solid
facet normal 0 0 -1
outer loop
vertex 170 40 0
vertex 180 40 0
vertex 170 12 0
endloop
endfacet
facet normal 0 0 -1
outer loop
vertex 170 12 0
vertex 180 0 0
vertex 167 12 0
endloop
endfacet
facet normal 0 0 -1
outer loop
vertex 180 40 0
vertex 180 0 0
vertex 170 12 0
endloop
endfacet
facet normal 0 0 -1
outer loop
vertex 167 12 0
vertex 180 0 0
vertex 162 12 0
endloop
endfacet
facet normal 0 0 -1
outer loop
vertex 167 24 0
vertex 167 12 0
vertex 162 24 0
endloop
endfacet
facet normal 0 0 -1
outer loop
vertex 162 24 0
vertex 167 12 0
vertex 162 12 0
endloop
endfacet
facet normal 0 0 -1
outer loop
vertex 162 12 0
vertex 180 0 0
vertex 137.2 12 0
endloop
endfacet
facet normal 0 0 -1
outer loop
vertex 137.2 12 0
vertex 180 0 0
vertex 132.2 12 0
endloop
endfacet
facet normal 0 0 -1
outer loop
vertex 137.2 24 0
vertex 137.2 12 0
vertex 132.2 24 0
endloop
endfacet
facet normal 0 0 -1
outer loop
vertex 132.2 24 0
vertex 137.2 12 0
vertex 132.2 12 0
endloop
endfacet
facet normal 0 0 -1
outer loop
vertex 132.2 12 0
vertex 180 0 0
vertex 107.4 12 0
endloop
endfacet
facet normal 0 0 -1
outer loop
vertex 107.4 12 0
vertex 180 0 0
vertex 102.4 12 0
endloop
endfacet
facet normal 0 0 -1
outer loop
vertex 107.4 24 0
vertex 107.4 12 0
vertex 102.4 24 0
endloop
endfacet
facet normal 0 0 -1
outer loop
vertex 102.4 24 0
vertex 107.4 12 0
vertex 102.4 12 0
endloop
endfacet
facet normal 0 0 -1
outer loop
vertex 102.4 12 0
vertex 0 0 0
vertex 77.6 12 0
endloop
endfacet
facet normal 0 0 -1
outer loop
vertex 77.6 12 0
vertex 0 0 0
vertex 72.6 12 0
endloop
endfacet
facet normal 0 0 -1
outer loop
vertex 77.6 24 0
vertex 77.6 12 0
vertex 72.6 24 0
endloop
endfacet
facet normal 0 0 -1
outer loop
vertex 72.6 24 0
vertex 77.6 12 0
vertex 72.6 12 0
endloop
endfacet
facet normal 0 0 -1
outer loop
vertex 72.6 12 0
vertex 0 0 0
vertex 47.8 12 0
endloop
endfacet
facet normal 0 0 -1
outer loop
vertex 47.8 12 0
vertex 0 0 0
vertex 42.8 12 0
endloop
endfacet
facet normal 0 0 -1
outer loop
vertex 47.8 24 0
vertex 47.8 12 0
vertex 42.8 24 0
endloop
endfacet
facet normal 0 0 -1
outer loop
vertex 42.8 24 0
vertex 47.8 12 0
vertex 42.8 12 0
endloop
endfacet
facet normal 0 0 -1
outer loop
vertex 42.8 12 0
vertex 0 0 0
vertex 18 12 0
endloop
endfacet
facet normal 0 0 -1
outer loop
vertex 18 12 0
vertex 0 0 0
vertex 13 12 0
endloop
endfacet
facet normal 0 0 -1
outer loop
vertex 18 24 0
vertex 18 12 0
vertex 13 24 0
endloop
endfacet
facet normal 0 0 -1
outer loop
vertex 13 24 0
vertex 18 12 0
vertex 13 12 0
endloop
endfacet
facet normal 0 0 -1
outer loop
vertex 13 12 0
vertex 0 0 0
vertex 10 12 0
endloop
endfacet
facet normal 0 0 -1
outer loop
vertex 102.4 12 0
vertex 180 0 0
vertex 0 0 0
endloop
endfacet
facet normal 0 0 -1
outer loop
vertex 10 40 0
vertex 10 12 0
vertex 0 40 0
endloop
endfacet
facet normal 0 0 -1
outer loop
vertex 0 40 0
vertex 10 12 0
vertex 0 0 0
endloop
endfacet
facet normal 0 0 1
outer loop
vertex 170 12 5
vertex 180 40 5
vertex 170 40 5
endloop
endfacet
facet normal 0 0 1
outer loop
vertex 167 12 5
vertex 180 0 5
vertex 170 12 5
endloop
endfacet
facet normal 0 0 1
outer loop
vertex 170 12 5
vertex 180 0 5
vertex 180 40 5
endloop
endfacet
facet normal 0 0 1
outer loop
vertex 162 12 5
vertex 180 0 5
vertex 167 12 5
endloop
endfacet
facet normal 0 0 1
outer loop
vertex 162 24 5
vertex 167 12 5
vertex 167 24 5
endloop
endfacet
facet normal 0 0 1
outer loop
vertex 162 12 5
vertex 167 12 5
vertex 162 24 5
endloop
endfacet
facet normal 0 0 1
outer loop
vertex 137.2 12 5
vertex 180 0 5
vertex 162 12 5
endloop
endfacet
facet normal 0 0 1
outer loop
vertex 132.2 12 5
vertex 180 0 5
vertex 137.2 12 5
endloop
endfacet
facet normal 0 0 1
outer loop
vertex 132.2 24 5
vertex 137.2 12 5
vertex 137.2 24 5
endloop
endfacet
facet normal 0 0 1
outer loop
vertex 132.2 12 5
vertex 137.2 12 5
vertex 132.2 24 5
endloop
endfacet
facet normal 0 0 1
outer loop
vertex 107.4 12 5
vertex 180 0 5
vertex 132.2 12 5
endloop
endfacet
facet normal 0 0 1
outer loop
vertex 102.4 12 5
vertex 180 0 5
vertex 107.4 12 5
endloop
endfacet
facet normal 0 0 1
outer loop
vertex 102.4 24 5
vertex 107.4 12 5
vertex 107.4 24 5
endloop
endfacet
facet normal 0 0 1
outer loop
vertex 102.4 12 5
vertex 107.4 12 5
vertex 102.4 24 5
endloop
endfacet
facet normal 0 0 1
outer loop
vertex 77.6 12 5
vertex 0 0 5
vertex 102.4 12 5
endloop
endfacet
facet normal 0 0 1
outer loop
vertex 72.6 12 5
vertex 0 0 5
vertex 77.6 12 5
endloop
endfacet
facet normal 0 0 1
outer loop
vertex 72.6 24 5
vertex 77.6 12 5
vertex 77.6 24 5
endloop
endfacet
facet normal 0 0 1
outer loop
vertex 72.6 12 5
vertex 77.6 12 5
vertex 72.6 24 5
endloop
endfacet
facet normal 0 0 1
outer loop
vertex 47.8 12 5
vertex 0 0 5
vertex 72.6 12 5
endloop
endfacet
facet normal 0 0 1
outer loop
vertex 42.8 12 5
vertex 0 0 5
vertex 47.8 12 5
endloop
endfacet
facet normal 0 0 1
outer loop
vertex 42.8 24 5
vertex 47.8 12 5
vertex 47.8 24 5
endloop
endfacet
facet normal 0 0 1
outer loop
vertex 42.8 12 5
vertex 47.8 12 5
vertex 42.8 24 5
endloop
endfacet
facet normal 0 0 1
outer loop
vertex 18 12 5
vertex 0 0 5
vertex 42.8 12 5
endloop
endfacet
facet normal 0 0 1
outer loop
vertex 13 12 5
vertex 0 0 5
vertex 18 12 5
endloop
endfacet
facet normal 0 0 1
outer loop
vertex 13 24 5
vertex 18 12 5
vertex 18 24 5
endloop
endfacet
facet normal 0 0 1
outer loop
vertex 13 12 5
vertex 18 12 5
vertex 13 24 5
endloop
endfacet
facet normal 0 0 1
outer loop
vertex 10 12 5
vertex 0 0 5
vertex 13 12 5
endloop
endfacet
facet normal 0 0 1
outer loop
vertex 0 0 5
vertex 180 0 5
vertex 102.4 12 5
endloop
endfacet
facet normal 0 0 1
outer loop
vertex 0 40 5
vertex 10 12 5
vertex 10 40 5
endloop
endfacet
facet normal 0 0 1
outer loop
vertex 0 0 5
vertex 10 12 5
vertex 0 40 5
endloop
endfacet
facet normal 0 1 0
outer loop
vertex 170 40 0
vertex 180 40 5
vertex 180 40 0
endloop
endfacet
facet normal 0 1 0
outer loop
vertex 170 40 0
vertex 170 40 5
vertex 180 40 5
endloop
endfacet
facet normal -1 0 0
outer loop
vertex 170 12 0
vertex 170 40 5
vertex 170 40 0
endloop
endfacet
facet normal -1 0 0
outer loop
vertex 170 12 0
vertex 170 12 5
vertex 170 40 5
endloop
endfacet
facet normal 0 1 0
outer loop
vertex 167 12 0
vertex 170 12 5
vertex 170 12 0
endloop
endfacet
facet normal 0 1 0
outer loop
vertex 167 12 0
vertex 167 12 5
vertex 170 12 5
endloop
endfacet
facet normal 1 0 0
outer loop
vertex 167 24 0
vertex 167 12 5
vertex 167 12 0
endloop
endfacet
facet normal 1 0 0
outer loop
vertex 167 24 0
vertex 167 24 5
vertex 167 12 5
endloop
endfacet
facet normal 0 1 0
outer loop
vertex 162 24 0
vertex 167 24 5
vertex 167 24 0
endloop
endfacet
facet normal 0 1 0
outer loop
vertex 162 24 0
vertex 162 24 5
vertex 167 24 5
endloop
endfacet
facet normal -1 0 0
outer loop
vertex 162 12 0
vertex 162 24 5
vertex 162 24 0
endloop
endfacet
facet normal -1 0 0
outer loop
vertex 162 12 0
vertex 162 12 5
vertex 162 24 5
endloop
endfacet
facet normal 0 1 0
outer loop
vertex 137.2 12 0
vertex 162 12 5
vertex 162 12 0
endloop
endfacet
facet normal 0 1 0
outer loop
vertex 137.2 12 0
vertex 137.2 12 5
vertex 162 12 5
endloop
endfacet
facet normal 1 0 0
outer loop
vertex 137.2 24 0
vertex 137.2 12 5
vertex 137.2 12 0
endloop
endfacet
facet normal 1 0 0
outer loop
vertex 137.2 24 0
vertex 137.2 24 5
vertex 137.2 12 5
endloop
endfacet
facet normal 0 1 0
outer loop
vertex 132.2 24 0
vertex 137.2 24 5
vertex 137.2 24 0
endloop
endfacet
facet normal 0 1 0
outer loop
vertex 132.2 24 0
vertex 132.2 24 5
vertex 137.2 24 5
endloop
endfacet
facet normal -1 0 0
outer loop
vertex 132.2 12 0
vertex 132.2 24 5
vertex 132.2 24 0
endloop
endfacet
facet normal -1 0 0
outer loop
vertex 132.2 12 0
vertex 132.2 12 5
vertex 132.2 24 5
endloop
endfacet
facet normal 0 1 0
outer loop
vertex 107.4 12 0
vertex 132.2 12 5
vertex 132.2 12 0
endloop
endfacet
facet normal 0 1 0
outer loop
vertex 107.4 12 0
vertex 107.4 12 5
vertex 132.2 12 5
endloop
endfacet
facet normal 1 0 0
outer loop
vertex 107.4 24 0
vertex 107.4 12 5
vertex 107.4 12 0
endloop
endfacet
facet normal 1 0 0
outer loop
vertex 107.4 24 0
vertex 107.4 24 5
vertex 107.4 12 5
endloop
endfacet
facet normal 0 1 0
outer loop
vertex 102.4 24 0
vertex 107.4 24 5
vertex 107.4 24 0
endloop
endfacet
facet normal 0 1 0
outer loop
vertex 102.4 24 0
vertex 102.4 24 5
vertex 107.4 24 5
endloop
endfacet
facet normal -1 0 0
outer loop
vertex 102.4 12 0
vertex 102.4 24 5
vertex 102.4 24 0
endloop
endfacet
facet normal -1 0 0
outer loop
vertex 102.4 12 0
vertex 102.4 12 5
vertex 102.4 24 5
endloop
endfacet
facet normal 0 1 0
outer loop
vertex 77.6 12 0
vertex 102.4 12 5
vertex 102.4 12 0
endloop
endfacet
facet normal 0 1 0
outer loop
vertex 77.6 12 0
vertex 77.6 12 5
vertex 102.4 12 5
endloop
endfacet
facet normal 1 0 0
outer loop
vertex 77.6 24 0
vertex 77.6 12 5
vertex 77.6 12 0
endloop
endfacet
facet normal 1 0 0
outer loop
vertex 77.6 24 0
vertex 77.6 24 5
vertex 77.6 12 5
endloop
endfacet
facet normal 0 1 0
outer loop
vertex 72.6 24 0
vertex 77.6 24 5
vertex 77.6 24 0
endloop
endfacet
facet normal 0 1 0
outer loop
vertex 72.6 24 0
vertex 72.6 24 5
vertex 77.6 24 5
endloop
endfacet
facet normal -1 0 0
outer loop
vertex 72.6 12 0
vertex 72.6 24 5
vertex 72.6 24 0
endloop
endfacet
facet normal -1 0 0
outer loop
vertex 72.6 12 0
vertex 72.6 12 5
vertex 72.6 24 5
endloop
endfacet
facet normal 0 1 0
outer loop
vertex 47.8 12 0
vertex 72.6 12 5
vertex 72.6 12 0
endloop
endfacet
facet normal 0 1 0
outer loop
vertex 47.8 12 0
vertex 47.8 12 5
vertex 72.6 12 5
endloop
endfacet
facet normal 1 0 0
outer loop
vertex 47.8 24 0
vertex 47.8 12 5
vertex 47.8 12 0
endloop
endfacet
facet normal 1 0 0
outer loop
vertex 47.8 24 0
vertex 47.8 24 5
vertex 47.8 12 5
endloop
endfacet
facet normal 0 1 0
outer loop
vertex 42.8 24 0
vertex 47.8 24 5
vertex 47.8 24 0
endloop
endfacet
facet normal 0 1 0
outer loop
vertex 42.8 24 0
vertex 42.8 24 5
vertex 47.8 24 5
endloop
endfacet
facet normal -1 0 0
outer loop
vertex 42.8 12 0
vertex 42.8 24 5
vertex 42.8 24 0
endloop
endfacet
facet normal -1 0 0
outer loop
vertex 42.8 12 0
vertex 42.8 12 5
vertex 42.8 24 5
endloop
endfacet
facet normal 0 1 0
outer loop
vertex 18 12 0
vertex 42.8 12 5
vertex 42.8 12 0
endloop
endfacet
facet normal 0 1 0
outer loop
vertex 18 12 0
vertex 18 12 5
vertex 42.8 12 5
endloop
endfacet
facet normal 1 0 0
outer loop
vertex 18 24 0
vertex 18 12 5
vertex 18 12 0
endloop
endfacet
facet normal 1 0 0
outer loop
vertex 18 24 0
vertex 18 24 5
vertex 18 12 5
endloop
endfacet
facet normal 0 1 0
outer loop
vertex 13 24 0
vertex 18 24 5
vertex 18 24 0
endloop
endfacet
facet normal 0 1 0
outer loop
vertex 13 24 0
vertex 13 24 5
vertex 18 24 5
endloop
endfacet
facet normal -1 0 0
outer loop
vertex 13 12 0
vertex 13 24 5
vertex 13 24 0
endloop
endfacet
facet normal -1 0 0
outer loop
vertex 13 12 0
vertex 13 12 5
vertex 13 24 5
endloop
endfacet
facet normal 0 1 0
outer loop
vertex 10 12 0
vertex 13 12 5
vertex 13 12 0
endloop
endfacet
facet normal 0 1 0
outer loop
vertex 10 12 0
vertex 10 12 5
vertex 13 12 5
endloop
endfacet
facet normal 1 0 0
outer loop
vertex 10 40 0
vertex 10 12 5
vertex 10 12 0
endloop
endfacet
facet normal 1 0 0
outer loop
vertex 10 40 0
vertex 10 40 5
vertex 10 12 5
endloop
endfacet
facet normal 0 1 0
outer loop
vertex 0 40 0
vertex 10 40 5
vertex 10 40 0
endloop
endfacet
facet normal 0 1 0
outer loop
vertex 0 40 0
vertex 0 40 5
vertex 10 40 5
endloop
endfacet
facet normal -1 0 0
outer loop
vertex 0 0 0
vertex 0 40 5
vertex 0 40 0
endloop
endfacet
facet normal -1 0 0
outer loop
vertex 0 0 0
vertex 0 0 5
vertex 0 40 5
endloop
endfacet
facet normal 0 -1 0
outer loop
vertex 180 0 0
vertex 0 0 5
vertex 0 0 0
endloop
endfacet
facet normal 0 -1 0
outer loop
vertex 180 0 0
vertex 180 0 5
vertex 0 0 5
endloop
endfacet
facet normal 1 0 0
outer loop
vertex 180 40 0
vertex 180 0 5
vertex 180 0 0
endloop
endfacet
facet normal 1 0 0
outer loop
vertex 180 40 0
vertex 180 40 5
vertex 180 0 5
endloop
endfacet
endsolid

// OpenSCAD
$fn = 32;

// ----------------------------------------------------------------------
// Guard grille: 6 slats over a 180 x 40 mm plate
// ----------------------------------------------------------------------

// --- parameters (mm) ---
profile_height = 5;       // extrusion height
profile_points = 32;      // points of the closed outline

profile = [[0, 0], [180, 0], [180, 40], [170, 40], [170, 12], [167, 12], [167, 24], [162, 24], [162, 12], [137.2, 12], [137.2, 24], [132.2, 24], [132.2, 12], [107.4, 12], [107.4, 24], [102.4, 24], [102.4, 12], [77.6, 12], [77.6, 24], [72.6, 24], [72.6, 12], [47.8, 12], [47.8, 24], [42.8, 24], [42.8, 12], [18, 12], [18, 24], [13, 24], [13, 12], [10, 12], [10, 40], [0, 40]];  // single closed polygon, 32 points, counter clockwise

// --- the one profile operation ---
linear_extrude(height = profile_height) polygon(points = profile);
